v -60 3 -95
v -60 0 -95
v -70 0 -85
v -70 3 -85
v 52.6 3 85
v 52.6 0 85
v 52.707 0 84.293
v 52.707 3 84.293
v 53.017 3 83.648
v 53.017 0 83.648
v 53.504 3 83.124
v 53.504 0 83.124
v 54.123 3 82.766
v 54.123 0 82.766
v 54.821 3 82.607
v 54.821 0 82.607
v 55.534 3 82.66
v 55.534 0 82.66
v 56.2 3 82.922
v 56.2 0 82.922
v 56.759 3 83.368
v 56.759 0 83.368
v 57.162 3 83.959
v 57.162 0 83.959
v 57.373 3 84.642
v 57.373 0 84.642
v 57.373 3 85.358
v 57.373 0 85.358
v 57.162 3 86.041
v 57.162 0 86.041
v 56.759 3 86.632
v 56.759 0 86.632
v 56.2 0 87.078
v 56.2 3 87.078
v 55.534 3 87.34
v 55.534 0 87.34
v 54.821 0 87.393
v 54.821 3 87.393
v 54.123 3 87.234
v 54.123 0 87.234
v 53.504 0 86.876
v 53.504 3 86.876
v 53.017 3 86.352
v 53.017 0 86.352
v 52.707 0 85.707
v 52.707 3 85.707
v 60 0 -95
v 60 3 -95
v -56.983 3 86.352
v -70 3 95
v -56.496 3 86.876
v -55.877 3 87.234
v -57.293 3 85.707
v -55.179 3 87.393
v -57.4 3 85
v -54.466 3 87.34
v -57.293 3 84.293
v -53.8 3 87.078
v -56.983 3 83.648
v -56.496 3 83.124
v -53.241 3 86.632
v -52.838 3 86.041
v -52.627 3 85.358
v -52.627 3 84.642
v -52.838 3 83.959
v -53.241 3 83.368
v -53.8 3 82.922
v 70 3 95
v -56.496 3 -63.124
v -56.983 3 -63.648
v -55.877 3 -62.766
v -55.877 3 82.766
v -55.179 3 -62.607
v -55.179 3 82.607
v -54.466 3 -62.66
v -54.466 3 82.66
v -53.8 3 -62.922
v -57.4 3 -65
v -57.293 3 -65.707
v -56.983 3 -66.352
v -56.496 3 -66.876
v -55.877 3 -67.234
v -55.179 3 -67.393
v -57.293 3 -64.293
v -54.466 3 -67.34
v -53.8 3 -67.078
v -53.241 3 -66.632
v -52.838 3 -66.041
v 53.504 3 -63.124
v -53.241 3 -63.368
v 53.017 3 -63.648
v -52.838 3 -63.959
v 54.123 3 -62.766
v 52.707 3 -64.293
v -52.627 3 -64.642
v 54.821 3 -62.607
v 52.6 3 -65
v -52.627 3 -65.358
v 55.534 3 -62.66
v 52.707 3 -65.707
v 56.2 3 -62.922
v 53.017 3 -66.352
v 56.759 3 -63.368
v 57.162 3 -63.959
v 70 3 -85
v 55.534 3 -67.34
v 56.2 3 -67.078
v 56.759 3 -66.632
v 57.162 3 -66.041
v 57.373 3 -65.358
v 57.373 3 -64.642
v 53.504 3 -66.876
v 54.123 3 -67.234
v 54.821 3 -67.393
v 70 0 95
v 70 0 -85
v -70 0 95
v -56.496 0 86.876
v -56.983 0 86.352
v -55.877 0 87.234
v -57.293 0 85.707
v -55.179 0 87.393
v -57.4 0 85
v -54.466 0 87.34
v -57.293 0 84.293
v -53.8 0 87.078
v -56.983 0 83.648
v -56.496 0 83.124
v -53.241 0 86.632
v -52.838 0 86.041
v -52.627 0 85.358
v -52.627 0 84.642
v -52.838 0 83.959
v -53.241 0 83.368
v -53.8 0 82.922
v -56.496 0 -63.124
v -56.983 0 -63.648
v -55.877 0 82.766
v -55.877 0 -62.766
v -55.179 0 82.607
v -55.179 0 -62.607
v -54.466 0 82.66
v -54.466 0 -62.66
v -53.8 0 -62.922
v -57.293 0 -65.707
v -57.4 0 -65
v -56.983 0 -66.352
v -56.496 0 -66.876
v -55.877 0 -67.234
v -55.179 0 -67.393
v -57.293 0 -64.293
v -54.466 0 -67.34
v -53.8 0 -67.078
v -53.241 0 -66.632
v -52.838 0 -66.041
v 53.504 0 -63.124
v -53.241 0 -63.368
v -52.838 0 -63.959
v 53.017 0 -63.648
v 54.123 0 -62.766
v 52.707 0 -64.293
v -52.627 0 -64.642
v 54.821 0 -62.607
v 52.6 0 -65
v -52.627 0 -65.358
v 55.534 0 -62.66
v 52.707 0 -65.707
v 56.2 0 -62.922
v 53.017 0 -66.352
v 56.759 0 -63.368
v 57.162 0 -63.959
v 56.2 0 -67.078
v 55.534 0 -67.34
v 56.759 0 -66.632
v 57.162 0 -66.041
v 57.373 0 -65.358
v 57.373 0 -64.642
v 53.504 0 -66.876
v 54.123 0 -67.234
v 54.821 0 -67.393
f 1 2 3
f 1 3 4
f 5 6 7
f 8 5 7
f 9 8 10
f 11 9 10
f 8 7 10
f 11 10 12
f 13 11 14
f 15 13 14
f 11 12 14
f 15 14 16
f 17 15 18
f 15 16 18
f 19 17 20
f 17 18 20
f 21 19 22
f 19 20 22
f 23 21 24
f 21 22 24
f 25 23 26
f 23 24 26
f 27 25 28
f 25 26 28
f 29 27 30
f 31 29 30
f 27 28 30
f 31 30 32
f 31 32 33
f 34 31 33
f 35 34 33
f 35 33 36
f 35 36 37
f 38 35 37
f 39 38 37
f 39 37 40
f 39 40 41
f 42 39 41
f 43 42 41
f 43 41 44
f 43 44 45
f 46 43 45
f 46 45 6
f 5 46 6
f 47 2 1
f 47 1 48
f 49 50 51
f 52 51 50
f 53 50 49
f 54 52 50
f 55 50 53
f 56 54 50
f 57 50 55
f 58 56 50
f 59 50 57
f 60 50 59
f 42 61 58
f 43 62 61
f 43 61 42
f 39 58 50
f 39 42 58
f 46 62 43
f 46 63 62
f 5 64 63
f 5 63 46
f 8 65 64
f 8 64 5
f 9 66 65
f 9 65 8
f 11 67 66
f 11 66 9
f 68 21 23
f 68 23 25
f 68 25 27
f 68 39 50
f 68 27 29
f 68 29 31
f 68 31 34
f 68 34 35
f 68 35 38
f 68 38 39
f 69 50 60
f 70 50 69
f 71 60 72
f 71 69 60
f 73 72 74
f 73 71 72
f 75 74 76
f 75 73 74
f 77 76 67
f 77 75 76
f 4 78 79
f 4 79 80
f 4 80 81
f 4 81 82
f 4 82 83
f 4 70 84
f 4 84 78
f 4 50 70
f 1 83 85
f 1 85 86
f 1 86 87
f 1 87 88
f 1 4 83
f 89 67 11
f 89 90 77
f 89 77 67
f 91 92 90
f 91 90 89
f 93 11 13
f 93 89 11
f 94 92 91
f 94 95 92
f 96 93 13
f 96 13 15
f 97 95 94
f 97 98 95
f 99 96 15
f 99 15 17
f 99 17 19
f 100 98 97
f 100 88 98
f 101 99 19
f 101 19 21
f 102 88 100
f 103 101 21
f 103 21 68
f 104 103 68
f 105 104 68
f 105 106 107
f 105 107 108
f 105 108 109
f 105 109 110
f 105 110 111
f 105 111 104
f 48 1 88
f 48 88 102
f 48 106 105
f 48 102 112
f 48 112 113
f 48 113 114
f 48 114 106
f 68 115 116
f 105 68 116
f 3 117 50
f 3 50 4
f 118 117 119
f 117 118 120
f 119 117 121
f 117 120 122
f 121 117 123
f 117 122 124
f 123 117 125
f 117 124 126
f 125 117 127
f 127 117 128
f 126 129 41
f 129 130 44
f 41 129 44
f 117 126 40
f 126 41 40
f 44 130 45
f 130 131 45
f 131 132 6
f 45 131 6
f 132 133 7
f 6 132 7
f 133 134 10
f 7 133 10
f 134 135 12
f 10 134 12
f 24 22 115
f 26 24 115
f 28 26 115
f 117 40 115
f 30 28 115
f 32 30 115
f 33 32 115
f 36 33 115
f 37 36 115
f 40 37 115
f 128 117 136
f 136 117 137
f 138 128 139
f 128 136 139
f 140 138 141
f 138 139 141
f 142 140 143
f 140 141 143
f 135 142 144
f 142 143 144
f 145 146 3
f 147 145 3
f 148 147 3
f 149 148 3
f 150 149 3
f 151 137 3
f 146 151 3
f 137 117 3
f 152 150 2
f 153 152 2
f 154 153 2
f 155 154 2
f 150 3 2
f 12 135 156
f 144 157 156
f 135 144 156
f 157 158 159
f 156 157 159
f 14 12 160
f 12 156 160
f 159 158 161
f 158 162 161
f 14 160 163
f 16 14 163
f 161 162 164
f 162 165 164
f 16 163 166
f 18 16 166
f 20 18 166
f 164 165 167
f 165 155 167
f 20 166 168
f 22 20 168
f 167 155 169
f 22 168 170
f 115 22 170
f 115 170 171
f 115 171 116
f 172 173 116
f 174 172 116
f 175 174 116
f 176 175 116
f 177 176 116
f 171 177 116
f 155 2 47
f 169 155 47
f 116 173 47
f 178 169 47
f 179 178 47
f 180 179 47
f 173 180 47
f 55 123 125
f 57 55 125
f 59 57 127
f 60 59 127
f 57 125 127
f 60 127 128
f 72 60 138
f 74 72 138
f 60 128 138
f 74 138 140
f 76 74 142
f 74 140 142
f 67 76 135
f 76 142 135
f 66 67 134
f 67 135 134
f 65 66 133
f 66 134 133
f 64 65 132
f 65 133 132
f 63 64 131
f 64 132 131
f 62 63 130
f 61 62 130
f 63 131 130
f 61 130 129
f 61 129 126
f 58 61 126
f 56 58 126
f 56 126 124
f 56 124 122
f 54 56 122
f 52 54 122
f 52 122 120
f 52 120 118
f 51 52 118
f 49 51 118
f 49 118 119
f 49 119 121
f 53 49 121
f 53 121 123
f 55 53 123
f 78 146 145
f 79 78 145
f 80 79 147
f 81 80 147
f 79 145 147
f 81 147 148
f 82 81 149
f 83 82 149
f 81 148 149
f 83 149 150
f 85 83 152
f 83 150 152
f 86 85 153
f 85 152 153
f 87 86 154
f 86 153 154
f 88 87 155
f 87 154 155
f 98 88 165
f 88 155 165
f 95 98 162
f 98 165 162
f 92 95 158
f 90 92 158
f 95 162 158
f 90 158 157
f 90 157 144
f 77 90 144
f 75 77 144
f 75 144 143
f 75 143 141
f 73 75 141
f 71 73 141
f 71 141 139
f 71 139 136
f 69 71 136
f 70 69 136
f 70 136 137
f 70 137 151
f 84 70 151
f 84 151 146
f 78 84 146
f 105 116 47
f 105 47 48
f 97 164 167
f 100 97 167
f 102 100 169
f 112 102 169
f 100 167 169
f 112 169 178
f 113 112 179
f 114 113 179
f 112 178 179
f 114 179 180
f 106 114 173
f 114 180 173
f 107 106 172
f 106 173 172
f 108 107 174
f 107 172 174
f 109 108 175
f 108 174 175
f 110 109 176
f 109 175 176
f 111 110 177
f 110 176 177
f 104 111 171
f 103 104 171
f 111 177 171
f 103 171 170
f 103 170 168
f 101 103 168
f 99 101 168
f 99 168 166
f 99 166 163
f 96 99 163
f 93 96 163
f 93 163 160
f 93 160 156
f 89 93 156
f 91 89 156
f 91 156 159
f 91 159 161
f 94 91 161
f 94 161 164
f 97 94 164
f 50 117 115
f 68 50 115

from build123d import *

# Parameters (mm, degrees)
SKETCH1_W            = 140
SKETCH1_H            = 190
BOSS_EXTRUDE1_DEPTH  = 3
M4_CLEARANCE_HOLE1_D = 4.8
CHAMFER1_SIZE        = 10


with BuildPart() as part:
    # Sketch1 → Boss-Extrude1 (new body)
    with BuildSketch(Plane(origin=(0, 0, 0), x_dir=(1, 0, 0), z_dir=(0, 1, 0))):
        Rectangle(SKETCH1_W, SKETCH1_H)
    extrude(amount=BOSS_EXTRUDE1_DEPTH)

    # M4 Clearance Hole1 (through all)
    with Locations(Plane(origin=(0, 3, 0), x_dir=(1, 0, 0), z_dir=(0, 1, 0))):
        with Locations((-55, -85), (55, -85), (-55, 65), (55, 65)):
            Hole(M4_CLEARANCE_HOLE1_D / 2)

    # Chamfer1
    chamfer1_edges = [part.edges().sort_by_distance(p)[0] for p in [
        (-70, 1.5, -95),
        (70, 1.5, -95),
    ]]
    chamfer(chamfer1_edges, length=CHAMFER1_SIZE)


solid = part.part
